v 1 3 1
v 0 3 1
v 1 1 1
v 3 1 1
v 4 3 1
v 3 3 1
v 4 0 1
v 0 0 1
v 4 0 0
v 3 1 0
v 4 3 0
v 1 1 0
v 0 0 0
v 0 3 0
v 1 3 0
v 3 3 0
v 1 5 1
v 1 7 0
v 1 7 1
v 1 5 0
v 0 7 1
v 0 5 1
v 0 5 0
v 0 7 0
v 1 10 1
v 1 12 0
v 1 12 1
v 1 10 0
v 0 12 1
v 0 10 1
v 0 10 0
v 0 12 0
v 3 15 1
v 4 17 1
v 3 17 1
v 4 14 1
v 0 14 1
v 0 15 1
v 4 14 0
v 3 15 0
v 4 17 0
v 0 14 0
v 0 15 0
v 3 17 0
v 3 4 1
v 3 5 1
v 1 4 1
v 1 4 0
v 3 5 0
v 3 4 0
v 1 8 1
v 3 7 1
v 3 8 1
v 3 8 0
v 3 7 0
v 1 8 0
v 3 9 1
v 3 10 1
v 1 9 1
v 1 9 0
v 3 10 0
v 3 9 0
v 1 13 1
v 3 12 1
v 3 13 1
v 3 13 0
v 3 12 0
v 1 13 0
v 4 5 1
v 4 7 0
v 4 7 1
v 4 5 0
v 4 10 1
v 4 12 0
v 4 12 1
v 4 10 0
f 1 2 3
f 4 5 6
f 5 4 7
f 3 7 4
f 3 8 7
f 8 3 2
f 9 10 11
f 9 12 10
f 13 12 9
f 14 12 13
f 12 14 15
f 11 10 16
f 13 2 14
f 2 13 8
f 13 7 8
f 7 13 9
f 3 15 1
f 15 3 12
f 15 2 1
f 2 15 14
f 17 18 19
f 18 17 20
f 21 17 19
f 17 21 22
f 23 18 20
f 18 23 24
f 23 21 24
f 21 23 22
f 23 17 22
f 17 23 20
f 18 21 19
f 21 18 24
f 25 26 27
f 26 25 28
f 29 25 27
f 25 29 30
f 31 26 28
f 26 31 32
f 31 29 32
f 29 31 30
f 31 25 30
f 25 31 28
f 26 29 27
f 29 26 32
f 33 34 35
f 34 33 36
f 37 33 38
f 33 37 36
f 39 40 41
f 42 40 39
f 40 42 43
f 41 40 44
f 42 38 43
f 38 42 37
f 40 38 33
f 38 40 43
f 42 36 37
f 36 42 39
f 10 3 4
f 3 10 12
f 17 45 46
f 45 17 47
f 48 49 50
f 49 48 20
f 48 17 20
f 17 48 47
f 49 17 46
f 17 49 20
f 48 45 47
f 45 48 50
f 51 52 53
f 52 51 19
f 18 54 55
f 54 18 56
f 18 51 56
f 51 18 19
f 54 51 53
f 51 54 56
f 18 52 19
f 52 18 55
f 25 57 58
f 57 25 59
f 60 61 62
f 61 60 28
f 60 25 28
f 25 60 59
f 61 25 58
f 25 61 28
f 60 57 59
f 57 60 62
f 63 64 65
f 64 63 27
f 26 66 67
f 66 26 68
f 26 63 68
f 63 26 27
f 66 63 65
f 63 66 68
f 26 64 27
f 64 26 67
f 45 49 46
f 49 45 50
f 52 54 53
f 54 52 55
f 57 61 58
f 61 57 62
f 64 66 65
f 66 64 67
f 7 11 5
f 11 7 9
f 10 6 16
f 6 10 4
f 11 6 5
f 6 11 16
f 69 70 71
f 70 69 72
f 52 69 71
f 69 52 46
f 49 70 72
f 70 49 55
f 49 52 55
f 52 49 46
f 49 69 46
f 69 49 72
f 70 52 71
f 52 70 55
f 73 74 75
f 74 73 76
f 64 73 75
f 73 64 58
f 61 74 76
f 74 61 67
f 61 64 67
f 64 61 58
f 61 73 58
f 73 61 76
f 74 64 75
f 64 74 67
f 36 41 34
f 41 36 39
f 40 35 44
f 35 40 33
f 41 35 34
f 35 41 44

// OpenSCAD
union () { 
translate([0,0,0]) cube([1,1,1]);
translate([0,1,0]) cube([1,1,1]);
translate([0,2,0]) cube([1,1,1]);
translate([0,5,0]) cube([1,1,1]);
translate([0,6,0]) cube([1,1,1]);
translate([0,10,0]) cube([1,1,1]);
translate([0,11,0]) cube([1,1,1]);
translate([0,14,0]) cube([1,1,1]);
translate([1,0,0]) cube([1,1,1]);
translate([1,4,0]) cube([1,1,1]);
translate([1,7,0]) cube([1,1,1]);
translate([1,9,0]) cube([1,1,1]);
translate([1,12,0]) cube([1,1,1]);
translate([1,14,0]) cube([1,1,1]);
translate([2,0,0]) cube([1,1,1]);
translate([2,4,0]) cube([1,1,1]);
translate([2,7,0]) cube([1,1,1]);
translate([2,9,0]) cube([1,1,1]);
translate([2,12,0]) cube([1,1,1]);
translate([2,14,0]) cube([1,1,1]);
translate([3,0,0]) cube([1,1,1]);
translate([3,1,0]) cube([1,1,1]);
translate([3,2,0]) cube([1,1,1]);
translate([3,5,0]) cube([1,1,1]);
translate([3,6,0]) cube([1,1,1]);
translate([3,10,0]) cube([1,1,1]);
translate([3,11,0]) cube([1,1,1]);
translate([3,14,0]) cube([1,1,1]);
translate([3,15,0]) cube([1,1,1]);
translate([3,16,0]) cube([1,1,1]);
}
